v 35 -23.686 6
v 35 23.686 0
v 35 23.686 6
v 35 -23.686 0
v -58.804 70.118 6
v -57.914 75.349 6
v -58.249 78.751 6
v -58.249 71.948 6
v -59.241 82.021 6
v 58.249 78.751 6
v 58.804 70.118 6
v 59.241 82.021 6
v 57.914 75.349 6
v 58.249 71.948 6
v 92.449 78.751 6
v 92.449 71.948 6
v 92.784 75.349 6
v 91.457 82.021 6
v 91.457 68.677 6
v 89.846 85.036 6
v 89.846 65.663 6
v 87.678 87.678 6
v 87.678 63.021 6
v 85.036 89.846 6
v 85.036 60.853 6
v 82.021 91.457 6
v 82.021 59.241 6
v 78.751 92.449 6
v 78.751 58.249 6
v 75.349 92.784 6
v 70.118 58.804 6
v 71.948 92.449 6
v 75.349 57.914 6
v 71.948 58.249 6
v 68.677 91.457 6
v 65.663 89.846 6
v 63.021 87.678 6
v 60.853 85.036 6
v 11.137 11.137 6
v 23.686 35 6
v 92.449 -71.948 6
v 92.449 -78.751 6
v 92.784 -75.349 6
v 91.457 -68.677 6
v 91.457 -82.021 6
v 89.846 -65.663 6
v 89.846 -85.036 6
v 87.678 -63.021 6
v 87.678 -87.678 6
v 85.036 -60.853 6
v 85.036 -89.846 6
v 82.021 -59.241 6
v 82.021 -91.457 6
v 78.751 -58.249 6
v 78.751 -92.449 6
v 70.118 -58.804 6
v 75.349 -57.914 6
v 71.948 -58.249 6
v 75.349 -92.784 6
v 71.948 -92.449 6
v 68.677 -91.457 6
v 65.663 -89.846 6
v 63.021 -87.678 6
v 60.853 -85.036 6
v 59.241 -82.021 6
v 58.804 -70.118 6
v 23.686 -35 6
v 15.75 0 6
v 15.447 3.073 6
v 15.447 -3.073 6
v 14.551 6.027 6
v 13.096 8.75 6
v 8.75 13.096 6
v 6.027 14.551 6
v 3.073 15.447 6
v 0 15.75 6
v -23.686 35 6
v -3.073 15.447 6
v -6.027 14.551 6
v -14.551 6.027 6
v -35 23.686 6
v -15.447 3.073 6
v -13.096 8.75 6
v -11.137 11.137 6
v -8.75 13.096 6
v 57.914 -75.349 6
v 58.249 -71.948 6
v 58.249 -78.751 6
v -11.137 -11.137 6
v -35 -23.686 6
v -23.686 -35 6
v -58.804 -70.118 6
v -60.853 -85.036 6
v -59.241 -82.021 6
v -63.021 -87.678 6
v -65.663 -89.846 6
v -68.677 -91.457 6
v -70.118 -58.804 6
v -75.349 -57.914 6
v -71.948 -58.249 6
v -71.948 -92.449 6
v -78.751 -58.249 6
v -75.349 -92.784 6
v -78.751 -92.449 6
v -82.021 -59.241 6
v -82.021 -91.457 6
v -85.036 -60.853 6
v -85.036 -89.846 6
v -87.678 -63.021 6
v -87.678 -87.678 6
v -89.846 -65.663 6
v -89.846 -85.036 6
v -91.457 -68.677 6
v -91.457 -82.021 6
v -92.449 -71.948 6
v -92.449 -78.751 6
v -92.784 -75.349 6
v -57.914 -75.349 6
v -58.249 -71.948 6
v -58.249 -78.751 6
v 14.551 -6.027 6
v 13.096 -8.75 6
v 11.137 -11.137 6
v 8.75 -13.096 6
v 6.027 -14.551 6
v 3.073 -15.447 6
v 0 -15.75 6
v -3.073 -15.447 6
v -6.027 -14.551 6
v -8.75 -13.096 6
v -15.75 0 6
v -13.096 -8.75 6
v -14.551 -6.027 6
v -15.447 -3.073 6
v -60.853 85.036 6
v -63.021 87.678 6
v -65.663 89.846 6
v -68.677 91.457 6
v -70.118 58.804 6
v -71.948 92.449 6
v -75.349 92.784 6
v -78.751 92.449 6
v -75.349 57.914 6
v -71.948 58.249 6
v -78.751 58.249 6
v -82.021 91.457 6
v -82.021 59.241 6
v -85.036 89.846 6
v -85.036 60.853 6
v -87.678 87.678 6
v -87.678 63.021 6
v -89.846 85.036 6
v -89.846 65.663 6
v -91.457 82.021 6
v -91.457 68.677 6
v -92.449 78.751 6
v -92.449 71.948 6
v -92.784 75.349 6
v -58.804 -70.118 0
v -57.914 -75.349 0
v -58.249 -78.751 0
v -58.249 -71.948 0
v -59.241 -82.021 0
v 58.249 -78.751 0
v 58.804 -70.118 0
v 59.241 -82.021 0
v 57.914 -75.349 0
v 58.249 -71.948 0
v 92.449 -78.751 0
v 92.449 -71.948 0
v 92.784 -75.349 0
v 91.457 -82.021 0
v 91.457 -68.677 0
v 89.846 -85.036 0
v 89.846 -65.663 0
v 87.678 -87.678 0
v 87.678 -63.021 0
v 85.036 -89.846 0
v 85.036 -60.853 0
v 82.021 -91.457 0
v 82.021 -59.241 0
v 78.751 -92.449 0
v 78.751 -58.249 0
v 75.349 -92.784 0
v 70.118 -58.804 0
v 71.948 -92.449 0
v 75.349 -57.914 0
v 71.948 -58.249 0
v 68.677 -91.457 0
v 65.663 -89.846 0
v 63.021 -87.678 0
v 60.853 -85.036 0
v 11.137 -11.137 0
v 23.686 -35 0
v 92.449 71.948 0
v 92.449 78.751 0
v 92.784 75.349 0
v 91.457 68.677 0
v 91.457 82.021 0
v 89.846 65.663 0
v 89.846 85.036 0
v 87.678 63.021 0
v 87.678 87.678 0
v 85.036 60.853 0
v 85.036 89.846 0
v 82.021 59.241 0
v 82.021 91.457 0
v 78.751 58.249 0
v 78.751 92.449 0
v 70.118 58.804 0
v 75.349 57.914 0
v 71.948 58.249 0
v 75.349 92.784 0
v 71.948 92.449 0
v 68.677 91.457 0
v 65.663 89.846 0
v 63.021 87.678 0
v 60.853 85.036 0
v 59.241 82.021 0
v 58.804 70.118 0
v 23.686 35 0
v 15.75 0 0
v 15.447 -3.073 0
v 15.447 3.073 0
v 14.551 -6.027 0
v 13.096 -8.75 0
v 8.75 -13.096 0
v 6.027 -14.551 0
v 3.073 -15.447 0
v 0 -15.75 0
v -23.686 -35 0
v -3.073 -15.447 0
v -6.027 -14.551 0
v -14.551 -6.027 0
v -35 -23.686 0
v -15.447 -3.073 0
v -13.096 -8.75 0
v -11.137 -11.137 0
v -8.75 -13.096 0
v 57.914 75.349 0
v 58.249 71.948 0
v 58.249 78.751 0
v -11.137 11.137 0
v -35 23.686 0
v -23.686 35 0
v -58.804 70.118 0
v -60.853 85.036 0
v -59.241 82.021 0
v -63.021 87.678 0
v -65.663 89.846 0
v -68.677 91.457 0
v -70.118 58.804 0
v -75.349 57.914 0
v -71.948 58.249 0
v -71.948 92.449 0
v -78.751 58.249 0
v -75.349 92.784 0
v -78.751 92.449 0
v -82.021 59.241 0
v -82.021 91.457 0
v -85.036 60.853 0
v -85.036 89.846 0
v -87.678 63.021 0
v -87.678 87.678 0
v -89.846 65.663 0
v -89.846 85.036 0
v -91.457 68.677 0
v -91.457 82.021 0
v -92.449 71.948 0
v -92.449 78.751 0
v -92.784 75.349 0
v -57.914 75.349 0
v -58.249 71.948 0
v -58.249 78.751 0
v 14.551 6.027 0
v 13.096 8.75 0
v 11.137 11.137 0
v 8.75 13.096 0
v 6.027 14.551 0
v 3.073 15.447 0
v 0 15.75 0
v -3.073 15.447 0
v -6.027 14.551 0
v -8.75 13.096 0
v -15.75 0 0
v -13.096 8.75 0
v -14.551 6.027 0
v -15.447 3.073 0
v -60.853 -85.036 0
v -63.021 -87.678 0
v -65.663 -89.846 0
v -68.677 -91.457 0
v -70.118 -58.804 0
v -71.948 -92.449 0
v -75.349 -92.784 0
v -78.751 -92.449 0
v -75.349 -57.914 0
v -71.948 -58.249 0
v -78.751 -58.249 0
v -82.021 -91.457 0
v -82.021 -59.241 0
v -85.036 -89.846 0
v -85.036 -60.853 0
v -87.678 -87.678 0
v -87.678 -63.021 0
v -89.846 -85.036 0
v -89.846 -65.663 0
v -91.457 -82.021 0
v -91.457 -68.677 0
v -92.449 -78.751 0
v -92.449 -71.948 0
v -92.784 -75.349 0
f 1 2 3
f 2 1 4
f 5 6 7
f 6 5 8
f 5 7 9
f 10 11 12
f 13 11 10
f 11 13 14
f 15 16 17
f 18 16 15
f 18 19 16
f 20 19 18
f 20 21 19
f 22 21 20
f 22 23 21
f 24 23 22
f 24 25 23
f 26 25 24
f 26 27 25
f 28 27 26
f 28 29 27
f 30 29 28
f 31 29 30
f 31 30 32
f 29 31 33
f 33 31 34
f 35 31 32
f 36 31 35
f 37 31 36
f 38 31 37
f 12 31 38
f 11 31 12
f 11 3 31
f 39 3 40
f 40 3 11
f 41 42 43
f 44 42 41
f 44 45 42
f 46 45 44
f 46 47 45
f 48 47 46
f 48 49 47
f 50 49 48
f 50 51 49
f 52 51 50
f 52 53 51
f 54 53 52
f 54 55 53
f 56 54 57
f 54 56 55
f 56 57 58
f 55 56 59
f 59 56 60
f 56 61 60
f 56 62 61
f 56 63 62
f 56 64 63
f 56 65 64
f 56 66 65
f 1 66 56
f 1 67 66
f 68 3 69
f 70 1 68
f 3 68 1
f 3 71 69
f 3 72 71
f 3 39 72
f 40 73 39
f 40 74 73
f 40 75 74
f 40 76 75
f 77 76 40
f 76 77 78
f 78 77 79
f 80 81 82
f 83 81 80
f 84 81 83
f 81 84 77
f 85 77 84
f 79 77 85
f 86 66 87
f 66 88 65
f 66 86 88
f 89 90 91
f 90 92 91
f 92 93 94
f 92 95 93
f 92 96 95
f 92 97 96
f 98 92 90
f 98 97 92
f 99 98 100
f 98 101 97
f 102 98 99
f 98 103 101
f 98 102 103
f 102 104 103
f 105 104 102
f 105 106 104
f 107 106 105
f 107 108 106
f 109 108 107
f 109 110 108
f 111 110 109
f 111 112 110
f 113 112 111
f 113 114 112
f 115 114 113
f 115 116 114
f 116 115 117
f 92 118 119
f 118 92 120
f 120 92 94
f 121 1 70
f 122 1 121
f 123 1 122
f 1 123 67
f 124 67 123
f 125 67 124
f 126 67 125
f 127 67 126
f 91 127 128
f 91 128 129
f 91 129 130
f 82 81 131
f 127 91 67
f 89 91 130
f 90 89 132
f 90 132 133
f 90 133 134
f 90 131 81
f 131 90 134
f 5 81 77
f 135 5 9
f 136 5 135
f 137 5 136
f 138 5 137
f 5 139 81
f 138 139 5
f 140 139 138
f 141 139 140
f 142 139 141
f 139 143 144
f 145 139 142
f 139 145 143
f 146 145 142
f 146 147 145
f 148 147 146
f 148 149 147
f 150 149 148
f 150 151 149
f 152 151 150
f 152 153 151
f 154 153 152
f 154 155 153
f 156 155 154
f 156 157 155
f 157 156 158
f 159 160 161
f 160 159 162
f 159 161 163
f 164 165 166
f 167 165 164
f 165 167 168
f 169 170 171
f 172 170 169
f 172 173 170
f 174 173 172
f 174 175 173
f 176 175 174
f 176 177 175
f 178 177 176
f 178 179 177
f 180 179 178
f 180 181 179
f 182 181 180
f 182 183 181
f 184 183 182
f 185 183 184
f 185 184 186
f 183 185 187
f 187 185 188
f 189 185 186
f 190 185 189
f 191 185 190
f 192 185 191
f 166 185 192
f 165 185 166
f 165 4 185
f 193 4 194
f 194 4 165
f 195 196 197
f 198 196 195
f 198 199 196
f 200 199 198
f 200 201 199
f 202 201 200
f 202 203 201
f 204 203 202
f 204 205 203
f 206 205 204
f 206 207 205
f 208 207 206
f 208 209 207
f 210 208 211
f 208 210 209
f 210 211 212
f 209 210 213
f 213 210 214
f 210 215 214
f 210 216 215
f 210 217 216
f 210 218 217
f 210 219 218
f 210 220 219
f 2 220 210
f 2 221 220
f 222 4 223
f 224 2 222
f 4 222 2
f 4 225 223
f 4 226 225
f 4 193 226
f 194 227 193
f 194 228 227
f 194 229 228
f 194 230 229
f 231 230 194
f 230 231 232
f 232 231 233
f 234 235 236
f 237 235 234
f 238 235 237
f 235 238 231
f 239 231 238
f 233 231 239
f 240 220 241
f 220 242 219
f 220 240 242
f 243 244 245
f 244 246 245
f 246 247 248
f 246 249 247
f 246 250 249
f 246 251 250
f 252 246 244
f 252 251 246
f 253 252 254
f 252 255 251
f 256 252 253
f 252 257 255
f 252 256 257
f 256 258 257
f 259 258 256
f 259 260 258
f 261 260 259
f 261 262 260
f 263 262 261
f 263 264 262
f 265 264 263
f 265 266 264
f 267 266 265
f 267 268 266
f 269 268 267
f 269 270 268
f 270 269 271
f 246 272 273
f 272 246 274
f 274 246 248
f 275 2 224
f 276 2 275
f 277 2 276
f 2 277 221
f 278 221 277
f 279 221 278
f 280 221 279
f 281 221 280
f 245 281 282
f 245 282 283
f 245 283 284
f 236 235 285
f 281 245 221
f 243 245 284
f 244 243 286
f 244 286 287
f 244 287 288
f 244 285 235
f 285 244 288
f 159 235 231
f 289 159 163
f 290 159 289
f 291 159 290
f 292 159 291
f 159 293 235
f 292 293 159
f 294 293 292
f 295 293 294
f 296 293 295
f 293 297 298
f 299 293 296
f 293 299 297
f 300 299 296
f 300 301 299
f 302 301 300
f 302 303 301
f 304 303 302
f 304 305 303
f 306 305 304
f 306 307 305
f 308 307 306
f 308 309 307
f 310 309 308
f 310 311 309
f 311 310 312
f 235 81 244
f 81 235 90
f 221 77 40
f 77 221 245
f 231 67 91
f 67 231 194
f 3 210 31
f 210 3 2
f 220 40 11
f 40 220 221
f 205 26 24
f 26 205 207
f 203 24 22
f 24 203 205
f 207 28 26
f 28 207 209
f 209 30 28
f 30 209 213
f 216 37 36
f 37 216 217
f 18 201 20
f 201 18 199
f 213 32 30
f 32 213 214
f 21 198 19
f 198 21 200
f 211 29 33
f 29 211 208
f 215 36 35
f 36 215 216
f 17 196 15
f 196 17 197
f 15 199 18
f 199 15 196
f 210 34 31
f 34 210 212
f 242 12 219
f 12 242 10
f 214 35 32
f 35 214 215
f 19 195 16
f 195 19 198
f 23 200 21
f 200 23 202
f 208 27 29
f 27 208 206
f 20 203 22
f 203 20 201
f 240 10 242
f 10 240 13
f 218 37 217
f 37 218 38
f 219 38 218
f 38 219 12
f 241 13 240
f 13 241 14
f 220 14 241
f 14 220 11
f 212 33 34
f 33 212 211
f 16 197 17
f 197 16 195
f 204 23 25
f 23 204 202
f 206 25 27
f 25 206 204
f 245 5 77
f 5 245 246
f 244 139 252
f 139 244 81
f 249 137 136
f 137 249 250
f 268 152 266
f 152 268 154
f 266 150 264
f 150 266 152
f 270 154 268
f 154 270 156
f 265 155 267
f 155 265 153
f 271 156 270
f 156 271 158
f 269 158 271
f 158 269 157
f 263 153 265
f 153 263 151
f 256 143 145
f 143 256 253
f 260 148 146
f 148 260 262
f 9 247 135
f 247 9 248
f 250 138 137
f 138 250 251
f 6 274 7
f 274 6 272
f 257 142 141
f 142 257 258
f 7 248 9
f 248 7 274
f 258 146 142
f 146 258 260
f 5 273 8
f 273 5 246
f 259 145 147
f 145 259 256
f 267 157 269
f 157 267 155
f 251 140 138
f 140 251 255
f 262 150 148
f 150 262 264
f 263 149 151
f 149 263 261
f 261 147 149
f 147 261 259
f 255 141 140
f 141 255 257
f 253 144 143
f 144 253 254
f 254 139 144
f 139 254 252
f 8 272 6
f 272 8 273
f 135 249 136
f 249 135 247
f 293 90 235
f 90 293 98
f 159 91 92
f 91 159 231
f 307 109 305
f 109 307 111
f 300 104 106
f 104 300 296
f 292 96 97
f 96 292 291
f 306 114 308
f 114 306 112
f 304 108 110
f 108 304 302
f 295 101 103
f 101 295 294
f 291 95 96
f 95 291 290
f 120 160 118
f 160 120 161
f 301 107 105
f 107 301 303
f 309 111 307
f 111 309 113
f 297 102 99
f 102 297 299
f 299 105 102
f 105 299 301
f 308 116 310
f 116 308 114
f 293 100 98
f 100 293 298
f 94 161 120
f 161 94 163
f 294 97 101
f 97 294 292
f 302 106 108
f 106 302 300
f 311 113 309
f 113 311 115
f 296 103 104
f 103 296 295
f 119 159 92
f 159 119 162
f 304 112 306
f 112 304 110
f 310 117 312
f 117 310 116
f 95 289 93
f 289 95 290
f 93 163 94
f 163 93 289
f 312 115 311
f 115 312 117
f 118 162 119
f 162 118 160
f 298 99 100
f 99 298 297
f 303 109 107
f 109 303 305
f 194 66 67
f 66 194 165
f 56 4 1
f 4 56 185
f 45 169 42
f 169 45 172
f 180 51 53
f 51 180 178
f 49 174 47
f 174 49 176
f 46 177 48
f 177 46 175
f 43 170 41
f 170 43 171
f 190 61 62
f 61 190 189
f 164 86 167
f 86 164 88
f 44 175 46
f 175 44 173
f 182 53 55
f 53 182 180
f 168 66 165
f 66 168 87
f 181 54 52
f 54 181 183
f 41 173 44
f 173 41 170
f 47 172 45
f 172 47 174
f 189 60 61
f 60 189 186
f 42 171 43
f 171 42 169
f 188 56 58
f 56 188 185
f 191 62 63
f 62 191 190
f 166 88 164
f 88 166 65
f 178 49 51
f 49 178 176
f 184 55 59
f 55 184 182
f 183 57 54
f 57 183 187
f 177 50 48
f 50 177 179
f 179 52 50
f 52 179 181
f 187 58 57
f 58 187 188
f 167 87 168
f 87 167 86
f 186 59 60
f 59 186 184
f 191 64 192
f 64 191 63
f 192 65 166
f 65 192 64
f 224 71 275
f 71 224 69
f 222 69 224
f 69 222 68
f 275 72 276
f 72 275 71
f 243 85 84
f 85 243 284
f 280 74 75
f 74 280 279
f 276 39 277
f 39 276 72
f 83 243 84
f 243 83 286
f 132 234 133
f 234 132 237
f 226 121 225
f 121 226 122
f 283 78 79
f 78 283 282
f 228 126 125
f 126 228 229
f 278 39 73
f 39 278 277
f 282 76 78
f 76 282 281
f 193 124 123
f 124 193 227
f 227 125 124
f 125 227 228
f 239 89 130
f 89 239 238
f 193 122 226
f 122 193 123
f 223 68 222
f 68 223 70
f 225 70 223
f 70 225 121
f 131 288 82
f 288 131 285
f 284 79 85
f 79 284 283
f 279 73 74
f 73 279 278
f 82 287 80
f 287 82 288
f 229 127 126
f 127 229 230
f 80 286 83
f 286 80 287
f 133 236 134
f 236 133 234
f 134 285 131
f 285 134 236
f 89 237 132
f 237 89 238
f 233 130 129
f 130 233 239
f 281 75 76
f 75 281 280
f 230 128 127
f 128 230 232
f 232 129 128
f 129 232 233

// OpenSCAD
$fn = 32;

// ----------------------------------------------------------------------
// Quadcopter frame: 248 mm across the motor pads, arms 106.56 mm
// ----------------------------------------------------------------------

// --- parameters (mm) ---
hub = 70;                 // central plate size
plate_t = 6;              // plate thickness
arm_len = 106.56;         // hub centre to motor pad centre
bar_w = 16;               // arm width
pad_d = 34.87;            // motor pad diameter
centre_d = 31.5;          // central cut-out for the stack

module arm_bar() {
  /* flat bar: hull of a stub inside the hub and a box at the pad */
  hull() {
    translate([hub / 4, 0, plate_t / 2]) cube([bar_w, bar_w, plate_t], center = true);
    translate([arm_len, 0, plate_t / 2]) cube([bar_w, bar_w, plate_t], center = true);
  }
}

module pad() {
  translate([arm_len, 0, 0]) cylinder(h = plate_t, d = pad_d);
}

module frame() {
  translate([-hub / 2, -hub / 2, 0]) cube([hub, hub, plate_t]);
  rotate([0, 0, 45]) arm_bar();
  rotate([0, 0, 45]) pad();
  rotate([0, 0, 135]) arm_bar();
  rotate([0, 0, 135]) pad();
  rotate([0, 0, 225]) arm_bar();
  rotate([0, 0, 225]) pad();
  rotate([0, 0, 315]) arm_bar();
  rotate([0, 0, 315]) pad();
}

difference() {
  frame();
  translate([0, 0, -1]) cylinder(h = plate_t + 2, d = centre_d);
}
